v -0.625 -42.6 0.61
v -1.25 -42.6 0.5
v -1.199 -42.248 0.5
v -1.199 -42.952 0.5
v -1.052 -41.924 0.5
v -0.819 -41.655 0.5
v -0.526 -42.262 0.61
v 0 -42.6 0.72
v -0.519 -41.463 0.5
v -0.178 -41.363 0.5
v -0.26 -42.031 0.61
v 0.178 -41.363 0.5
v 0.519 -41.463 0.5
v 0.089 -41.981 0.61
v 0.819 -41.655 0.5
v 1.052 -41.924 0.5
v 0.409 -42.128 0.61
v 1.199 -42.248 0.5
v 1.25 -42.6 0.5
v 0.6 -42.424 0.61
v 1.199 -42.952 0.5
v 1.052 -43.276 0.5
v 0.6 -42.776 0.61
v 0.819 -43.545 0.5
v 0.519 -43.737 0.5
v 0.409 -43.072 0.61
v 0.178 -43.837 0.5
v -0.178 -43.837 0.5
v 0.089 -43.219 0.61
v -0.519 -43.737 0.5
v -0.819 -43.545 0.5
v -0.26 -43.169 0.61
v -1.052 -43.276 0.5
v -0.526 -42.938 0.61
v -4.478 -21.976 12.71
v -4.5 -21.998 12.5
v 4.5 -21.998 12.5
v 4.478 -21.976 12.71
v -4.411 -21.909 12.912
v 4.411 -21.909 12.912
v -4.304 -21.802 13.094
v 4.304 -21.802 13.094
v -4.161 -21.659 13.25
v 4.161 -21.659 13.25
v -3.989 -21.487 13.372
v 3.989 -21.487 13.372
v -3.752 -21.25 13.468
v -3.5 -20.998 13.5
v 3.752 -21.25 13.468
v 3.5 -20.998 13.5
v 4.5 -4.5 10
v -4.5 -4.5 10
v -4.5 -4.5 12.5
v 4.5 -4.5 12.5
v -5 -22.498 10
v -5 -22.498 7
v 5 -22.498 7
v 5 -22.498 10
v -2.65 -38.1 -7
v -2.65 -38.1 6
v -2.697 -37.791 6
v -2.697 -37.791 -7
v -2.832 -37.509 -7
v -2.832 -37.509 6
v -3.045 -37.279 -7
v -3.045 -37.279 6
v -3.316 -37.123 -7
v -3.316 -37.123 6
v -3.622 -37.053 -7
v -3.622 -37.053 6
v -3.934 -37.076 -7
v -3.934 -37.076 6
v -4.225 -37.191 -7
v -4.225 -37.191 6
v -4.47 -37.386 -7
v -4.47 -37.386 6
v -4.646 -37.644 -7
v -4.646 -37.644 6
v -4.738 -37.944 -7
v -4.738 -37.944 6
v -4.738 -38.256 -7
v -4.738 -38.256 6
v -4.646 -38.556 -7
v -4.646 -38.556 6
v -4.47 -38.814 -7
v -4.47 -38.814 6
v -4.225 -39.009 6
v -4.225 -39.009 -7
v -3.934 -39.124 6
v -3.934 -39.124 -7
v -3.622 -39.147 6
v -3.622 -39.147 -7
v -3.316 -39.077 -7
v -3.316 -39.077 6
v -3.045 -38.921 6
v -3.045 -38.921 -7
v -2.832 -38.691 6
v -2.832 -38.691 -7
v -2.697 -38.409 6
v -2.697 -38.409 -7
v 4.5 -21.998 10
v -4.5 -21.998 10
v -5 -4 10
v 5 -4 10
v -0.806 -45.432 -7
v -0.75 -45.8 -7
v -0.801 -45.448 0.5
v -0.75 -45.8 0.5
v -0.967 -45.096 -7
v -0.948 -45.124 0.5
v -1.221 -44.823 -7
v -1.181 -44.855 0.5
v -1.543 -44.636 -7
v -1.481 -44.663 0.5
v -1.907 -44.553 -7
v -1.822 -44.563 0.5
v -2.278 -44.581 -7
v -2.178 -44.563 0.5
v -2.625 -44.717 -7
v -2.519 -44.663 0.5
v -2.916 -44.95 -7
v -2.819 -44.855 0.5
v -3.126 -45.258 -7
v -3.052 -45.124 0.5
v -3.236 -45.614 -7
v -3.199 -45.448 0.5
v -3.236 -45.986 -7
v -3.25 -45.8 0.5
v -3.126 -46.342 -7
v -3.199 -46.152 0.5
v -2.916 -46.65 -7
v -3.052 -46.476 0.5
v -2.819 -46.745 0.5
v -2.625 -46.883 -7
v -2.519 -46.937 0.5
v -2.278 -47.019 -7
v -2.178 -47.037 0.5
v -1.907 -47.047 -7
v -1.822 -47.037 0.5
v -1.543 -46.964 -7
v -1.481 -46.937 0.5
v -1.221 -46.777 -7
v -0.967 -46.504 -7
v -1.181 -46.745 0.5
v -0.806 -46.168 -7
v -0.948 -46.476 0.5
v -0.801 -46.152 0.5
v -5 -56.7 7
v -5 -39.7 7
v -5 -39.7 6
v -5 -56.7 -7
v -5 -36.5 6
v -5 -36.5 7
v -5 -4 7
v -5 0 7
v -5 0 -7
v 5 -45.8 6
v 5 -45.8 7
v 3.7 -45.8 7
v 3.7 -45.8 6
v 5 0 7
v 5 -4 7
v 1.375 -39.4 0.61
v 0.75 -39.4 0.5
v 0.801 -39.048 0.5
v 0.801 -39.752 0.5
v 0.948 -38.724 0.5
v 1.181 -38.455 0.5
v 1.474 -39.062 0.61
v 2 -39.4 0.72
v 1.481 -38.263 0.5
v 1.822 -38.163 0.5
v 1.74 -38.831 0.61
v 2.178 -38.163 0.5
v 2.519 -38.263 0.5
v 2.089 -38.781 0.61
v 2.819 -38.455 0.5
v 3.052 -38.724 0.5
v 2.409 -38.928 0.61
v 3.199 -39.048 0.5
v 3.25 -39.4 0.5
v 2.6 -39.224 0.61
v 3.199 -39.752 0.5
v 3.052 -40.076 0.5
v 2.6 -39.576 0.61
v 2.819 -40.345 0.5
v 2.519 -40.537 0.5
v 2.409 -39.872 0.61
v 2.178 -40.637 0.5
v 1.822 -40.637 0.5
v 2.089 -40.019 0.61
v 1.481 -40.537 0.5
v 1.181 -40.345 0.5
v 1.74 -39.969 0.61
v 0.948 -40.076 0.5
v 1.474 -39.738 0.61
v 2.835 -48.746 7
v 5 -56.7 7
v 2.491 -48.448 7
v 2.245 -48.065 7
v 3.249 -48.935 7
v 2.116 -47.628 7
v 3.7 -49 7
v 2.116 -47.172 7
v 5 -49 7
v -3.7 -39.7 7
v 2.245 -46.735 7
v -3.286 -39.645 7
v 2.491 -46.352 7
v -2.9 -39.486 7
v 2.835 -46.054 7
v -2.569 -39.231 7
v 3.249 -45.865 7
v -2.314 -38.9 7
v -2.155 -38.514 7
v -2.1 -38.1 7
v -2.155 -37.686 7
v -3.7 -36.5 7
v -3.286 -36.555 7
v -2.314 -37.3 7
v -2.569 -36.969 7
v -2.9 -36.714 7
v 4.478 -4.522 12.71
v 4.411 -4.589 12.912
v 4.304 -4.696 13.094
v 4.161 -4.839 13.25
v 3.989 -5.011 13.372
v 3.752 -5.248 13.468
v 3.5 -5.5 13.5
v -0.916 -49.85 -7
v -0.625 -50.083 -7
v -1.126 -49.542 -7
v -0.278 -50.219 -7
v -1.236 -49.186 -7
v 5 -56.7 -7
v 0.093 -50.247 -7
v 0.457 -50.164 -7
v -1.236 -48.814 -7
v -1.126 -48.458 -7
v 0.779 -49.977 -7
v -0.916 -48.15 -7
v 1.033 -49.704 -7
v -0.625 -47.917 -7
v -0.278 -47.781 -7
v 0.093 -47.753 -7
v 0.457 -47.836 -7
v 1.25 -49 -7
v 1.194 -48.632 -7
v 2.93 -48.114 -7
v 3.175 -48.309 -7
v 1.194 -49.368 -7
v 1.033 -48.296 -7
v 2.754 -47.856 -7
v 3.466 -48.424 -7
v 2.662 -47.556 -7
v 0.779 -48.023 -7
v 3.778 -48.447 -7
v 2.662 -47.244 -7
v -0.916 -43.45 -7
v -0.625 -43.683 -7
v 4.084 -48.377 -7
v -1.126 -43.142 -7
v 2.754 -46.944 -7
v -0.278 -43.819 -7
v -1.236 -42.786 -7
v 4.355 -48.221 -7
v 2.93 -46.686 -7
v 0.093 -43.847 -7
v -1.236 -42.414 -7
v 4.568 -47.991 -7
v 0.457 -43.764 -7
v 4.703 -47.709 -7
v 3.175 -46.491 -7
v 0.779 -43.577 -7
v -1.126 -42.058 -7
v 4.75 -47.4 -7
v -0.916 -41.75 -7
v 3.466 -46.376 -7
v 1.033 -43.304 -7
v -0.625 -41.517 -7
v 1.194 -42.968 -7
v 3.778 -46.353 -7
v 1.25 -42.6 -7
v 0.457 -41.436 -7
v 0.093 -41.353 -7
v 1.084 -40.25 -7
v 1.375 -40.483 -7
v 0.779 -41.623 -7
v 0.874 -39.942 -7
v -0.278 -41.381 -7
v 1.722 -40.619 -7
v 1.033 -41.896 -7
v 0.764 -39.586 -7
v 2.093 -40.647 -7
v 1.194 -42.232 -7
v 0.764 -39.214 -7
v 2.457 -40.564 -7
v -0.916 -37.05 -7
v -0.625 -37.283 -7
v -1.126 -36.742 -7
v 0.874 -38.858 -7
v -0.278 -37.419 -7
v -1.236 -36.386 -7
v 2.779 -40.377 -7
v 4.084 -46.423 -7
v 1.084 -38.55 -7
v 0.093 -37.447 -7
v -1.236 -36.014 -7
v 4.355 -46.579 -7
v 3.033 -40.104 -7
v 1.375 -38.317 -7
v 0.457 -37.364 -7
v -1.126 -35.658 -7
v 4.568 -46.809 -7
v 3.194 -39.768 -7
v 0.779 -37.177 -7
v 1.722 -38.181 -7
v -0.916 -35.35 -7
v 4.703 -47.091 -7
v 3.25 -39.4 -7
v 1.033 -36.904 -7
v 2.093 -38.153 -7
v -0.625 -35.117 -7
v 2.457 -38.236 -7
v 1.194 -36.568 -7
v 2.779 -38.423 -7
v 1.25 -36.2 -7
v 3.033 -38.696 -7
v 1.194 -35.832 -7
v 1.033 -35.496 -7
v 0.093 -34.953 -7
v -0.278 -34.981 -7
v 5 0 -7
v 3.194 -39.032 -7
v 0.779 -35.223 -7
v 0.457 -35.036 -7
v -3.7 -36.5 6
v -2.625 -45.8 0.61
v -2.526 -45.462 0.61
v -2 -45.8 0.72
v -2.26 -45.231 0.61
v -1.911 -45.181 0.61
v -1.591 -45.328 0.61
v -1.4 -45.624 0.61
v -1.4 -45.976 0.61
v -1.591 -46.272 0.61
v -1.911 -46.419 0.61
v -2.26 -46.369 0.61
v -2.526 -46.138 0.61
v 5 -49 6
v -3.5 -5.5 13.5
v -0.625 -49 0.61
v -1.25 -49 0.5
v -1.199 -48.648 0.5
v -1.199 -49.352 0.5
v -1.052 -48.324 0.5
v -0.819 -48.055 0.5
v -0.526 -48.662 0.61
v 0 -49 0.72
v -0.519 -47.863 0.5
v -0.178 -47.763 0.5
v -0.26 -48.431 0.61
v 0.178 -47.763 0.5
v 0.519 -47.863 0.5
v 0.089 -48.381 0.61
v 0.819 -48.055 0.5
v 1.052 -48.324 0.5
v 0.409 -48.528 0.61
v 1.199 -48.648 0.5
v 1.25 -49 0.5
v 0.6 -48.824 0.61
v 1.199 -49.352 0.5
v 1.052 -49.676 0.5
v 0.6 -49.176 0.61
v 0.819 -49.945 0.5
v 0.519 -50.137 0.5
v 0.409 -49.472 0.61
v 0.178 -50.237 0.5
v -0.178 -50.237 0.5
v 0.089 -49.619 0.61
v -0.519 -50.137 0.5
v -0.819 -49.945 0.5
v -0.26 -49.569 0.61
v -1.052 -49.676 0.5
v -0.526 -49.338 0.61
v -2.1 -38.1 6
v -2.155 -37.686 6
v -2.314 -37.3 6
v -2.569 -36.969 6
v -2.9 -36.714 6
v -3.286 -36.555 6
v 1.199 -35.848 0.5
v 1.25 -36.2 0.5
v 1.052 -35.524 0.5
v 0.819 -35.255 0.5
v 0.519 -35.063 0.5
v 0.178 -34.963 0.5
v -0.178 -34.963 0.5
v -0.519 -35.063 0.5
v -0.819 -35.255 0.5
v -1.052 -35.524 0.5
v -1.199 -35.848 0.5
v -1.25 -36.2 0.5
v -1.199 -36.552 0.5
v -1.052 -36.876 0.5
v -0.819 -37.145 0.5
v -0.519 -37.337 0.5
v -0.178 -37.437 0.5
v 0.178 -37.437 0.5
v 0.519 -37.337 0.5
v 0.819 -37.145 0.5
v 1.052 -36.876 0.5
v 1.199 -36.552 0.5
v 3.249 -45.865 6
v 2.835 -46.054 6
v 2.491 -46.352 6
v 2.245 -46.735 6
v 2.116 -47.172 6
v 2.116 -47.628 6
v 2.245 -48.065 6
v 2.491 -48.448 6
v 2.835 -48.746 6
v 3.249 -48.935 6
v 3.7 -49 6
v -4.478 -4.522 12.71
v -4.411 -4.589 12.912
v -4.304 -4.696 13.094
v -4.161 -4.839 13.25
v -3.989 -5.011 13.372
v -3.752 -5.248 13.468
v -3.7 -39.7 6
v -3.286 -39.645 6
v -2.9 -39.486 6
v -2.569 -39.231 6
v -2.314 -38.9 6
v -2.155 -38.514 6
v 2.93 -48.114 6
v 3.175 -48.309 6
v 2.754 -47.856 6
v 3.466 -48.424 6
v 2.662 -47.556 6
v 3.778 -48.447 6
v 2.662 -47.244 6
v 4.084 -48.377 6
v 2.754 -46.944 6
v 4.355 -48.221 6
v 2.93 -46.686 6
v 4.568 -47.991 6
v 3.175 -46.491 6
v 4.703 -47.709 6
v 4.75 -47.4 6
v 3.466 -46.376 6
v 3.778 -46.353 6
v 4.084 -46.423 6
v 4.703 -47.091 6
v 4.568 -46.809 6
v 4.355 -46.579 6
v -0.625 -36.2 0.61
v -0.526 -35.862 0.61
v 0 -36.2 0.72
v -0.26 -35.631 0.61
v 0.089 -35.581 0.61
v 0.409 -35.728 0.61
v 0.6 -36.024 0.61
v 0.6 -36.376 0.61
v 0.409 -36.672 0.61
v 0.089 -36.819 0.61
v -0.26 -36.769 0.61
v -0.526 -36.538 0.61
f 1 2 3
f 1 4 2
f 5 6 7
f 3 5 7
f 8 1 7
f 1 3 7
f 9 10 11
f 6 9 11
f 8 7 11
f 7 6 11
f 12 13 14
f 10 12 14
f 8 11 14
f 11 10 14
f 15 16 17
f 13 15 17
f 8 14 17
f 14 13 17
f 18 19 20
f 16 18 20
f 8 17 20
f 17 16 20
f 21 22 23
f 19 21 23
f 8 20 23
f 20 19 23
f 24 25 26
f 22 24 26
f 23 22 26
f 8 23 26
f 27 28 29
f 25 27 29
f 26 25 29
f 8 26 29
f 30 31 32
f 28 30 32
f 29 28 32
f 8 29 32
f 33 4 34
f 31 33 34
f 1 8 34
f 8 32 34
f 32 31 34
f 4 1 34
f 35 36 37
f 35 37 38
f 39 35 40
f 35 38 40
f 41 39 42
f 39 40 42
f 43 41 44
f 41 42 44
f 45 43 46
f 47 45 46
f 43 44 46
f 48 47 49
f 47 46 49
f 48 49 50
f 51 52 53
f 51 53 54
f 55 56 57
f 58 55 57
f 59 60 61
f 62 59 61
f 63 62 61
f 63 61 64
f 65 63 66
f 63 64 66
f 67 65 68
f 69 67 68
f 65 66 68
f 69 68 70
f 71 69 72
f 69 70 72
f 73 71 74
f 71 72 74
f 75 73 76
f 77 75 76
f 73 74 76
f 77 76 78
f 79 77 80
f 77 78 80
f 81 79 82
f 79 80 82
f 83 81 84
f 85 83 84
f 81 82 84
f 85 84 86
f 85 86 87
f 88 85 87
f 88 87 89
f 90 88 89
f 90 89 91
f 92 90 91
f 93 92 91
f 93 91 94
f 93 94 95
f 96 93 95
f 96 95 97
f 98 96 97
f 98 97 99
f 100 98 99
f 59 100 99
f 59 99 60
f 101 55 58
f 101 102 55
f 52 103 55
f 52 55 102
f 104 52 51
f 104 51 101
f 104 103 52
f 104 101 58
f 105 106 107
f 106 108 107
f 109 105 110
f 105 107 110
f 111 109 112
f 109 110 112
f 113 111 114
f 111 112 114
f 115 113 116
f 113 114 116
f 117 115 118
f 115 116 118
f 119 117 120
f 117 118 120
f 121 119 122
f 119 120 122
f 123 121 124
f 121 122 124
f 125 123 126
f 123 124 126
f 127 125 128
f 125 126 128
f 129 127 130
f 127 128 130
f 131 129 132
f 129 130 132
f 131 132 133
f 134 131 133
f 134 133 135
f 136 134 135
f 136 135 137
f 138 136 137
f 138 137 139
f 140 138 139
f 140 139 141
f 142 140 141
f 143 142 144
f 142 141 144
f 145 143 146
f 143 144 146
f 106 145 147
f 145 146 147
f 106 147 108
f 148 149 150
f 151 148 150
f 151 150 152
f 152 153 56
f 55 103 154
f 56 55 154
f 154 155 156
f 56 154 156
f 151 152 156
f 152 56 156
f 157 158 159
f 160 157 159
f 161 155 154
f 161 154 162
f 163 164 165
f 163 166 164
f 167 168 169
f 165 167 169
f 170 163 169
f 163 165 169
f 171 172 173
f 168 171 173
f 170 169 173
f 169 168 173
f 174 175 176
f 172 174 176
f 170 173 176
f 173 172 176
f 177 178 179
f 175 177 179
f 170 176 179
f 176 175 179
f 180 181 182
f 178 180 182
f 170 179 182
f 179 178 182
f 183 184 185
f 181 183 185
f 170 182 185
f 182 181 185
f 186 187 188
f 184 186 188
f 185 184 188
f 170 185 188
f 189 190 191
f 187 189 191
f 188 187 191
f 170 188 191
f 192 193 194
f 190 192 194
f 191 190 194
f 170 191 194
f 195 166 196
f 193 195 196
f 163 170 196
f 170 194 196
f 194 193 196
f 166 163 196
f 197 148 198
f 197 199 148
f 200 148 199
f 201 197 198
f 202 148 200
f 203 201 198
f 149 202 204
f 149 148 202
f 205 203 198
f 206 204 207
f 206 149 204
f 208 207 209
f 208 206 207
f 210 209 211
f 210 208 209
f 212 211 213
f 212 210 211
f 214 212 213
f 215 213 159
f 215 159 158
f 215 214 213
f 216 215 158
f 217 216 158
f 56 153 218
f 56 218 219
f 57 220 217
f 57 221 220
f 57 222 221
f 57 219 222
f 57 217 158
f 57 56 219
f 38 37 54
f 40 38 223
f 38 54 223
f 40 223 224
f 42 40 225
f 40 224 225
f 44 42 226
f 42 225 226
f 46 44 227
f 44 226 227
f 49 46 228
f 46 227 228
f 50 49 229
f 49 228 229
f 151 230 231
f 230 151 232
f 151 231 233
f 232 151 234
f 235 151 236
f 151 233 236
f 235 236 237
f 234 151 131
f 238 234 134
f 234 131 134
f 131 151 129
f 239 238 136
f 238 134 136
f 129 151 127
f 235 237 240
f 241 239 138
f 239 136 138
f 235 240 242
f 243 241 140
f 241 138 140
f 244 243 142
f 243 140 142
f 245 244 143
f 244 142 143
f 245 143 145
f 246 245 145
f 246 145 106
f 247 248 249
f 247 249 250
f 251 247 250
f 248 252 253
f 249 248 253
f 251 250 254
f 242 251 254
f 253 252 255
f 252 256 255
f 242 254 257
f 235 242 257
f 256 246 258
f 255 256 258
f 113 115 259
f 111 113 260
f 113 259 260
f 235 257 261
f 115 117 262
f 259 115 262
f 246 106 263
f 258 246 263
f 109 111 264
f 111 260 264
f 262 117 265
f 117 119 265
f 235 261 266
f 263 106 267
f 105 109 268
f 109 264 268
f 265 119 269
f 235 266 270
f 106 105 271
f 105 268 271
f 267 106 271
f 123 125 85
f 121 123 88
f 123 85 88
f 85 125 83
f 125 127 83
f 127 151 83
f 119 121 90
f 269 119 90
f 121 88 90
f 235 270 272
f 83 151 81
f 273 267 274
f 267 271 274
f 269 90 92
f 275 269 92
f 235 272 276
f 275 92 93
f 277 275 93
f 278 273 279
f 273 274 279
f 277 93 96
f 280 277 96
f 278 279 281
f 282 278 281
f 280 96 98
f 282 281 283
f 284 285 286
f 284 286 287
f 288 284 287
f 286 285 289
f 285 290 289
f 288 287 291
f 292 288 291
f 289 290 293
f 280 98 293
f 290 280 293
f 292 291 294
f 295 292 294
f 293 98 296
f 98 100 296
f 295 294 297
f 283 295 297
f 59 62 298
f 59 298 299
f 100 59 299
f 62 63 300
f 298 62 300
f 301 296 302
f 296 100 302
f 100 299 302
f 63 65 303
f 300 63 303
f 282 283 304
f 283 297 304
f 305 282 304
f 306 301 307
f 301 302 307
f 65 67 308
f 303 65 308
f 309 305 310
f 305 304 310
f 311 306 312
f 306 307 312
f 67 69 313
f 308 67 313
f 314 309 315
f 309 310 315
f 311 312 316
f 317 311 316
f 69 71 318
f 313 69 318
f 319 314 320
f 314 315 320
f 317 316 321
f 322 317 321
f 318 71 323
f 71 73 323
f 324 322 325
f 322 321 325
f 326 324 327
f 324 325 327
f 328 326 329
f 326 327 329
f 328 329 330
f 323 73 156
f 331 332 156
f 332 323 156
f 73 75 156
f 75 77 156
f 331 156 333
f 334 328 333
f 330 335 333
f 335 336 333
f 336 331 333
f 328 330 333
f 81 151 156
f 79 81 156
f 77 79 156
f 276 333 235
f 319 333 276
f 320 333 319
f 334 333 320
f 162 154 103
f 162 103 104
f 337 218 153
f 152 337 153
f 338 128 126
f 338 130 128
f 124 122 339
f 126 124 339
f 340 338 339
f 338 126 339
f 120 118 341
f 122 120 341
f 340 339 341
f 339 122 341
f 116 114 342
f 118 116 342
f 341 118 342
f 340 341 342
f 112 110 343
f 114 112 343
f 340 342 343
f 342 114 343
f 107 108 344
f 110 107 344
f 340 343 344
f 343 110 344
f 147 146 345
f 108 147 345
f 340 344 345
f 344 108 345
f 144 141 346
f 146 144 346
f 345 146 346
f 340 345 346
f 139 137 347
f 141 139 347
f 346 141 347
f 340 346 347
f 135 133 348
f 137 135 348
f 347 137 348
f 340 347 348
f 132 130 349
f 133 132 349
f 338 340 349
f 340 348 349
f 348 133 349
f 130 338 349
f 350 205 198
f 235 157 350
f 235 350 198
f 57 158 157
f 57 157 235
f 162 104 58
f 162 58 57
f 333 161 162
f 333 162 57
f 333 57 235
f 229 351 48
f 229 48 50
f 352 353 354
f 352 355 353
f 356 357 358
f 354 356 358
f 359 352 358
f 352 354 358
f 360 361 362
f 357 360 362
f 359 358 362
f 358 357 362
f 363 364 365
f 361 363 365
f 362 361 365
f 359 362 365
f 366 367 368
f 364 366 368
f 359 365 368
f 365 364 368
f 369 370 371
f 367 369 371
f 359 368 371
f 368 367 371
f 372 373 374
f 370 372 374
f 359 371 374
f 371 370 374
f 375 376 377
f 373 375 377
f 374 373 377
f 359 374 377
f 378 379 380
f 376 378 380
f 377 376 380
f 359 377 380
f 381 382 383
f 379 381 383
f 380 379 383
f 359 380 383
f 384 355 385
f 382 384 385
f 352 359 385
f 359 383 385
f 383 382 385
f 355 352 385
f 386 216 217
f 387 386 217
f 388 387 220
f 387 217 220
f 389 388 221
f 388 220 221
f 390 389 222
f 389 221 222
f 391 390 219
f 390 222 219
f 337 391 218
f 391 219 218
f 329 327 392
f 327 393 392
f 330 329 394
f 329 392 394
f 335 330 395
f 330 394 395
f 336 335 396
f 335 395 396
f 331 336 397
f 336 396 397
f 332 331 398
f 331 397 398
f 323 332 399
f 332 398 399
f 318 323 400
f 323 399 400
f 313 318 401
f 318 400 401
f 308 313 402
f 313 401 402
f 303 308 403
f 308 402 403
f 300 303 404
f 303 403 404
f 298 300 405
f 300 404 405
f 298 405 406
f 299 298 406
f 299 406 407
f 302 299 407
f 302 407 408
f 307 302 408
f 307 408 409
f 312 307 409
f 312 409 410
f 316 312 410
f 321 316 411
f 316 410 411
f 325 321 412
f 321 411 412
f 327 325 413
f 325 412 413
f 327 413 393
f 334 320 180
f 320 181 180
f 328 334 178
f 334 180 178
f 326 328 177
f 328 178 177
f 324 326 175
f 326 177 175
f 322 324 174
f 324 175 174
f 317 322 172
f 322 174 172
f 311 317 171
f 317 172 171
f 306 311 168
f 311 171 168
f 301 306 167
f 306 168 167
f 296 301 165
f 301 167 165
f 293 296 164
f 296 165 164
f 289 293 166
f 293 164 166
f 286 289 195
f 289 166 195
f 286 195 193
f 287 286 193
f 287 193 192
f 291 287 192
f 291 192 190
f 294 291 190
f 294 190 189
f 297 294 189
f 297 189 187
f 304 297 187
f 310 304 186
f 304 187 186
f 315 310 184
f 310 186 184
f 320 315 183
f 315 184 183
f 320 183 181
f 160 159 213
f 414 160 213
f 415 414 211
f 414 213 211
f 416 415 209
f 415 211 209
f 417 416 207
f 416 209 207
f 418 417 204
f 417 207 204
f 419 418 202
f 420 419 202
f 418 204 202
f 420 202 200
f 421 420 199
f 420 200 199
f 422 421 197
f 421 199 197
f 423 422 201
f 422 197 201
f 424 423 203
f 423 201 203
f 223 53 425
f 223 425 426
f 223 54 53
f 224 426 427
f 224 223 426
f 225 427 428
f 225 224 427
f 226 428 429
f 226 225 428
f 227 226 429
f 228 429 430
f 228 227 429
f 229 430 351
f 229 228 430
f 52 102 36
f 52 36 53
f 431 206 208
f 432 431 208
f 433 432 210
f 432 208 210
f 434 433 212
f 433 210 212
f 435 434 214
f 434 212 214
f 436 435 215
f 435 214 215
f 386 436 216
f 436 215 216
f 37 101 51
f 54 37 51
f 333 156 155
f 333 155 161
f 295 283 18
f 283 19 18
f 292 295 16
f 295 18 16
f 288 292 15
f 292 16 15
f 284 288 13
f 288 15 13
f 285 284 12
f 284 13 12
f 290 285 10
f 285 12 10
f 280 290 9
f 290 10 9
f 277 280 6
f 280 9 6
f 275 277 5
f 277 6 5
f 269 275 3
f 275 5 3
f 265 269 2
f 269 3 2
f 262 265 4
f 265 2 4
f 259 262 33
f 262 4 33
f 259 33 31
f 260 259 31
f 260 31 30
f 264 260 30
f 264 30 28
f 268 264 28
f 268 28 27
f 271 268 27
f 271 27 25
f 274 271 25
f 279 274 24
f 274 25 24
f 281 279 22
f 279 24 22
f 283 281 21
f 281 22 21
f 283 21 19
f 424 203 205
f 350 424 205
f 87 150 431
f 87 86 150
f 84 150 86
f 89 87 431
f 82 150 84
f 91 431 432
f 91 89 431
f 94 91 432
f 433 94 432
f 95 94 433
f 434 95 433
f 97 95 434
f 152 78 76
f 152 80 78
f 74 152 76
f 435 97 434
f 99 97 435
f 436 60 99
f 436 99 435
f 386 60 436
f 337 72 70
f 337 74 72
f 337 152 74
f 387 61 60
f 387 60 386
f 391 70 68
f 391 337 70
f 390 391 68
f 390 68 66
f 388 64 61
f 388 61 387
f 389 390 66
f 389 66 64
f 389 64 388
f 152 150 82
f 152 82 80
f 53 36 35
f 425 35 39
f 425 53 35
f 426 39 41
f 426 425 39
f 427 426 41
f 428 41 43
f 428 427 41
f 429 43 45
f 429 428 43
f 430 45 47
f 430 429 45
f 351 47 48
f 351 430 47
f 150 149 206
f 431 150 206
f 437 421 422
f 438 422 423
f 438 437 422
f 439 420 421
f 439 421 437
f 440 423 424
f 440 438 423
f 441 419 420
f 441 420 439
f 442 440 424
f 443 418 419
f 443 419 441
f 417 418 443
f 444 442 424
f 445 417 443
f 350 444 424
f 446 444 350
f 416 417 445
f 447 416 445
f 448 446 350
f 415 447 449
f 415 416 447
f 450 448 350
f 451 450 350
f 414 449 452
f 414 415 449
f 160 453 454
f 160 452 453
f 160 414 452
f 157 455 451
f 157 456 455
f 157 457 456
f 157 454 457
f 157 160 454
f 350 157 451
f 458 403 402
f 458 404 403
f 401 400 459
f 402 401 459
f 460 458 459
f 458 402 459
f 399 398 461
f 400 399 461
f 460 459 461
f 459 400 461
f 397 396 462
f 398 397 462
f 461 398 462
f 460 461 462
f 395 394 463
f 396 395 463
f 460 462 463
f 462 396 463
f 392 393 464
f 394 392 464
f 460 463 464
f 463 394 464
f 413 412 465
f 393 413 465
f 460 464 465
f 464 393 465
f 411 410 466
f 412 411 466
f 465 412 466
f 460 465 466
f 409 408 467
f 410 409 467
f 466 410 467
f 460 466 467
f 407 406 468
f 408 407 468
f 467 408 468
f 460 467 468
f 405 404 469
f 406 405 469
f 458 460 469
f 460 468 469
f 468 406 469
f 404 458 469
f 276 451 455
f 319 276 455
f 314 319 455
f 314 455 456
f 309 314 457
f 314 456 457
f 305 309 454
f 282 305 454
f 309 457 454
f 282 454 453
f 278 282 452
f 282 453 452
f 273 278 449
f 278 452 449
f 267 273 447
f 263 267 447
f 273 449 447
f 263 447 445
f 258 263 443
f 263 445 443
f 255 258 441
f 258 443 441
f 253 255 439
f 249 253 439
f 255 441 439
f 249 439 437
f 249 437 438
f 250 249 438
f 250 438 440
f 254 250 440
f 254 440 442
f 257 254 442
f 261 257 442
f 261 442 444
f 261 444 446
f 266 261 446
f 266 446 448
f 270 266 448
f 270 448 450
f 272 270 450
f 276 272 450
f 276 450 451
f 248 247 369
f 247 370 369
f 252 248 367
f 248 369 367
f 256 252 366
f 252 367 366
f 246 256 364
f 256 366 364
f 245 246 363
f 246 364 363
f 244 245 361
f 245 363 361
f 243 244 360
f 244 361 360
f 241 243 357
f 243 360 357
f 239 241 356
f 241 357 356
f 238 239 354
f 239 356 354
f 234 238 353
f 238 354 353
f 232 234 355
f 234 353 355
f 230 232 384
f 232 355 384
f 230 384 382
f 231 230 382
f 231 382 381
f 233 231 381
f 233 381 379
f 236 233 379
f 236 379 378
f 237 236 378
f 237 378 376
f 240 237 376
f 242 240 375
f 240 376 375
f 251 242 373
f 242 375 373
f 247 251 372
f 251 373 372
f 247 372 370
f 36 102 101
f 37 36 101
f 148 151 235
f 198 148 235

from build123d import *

# Parameters (mm, degrees)
SKETCH1_W                         = 10
SKETCH1_H                         = 14
EXTRUDE1_DEPTH                    = 56.7
SKETCH2_W                         = 10
SKETCH2_H                         = 18.498
EXTRUDE2_DEPTH                    = 3
M3X0_5_TAPPED_HOLE1_D             = 2.5
M3X0_5_TAPPED_HOLE1_DEPTH         = 7.5
M3X0_5_TAPPED_HOLE1_TIP           = 0.220408726
SKETCH5_R                         = 1.05
MANIFOLD_SCREWS_COUNTERBORE_DEPTH = 15
SKETCH6_R                         = 1.05
MOUNTING_HOLE_DEPTH               = 1
SKETCH7_W                         = 9
SKETCH7_H                         = 17.498
EXTRUDE3_DEPTH                    = 3.5
FILLET1_R                         = 1


with BuildPart() as part:
    # Sketch1 → Extrude1 (new body)
    with BuildSketch(Plane(origin=(0, 0, 0), x_dir=(1, 0, 0), z_dir=(0, 1, 0))):
        Rectangle(SKETCH1_W, SKETCH1_H)
    extrude(amount=-EXTRUDE1_DEPTH)

    # Sketch2 → Extrude2 (add)
    with BuildSketch(Plane.XY.offset(7)):
        with Locations((0, -13.249)):
            Rectangle(SKETCH2_W, SKETCH2_H)
    extrude(amount=EXTRUDE2_DEPTH)

    # M3x0.5 Tapped Hole1
    with Locations(Plane(origin=(0, -36.2, -7), x_dir=(-1, 0, 0), z_dir=(0, 0, -1))):
        with Locations((0, 0), (0, -6.4), (0, -12.8), (2, -9.6), (-2, -3.2)):
            Hole(M3X0_5_TAPPED_HOLE1_D / 2, depth=M3X0_5_TAPPED_HOLE1_DEPTH)
            with Locations((0, 0, -(M3X0_5_TAPPED_HOLE1_DEPTH + M3X0_5_TAPPED_HOLE1_TIP / 2))):  # 160° drill point
                Cone(0, M3X0_5_TAPPED_HOLE1_D / 2, M3X0_5_TAPPED_HOLE1_TIP, mode=Mode.SUBTRACT)

    # Sketch5 → Manifold Screws Counterbore (cut, through all)
    with BuildSketch(Plane.XY.offset(7)):
        with Locations((-3.7, -38.1)):
            Circle(SKETCH5_R)
        with Locations((3.7, -47.4)):
            Circle(SKETCH5_R)
    extrude(amount=-MANIFOLD_SCREWS_COUNTERBORE_DEPTH, mode=Mode.SUBTRACT)

    # Sketch6 → Mounting Hole (cut)
    with BuildSketch(Plane.XY.offset(7)):
        with BuildLine():
            ThreePointArc((-2.1, -38.1), (-2.56862915, -36.96862915), (-3.7, -36.5))
            ThreePointArc((-3.7, -36.5), (-4.4306228, -36.676556877), (-5, -37.167262095))
            Line((-5, -37.167262095), (-5, -39.032737905))
            ThreePointArc((-5, -39.032737905), (-4.4306228, -39.523443123), (-3.7, -39.7))
            ThreePointArc((-3.7, -39.7), (-2.56862915, -39.23137085), (-2.1, -38.1))
        make_face()
        with Locations((-3.7, -38.1)):
            Circle(SKETCH6_R, mode=Mode.SUBTRACT)
        with BuildLine():
            Line((5, -48.332737905), (5, -46.467262095))
            ThreePointArc((5, -46.467262095), (4.4306228, -45.976556877), (3.7, -45.8))
            ThreePointArc((3.7, -45.8), (2.1, -47.4), (3.7, -49))
            ThreePointArc((3.7, -49), (4.4306228, -48.823443123), (5, -48.332737905))
        make_face()
        with Locations((3.7, -47.4)):
            Circle(SKETCH6_R, mode=Mode.SUBTRACT)
        with BuildLine():
            Line((5, -46.467262095), (5, -45.8))
            Line((5, -45.8), (3.7, -45.8))
            ThreePointArc((3.7, -45.8), (4.4306228, -45.976556877), (5, -46.467262095))
        make_face()
        with BuildLine():
            Line((5, -49), (5, -48.332737905))
            ThreePointArc((5, -48.332737905), (4.4306228, -48.823443123), (3.7, -49))
            Line((3.7, -49), (5, -49))
        make_face()
        with BuildLine():
            ThreePointArc((-5, -37.167262095), (-4.4306228, -36.676556877), (-3.7, -36.5))
            Line((-3.7, -36.5), (-5, -36.5))
            Line((-5, -36.5), (-5, -37.167262095))
        make_face()
        with BuildLine():
            Line((-5, -39.7), (-3.7, -39.7))
            ThreePointArc((-3.7, -39.7), (-4.4306228, -39.523443123), (-5, -39.032737905))
            Line((-5, -39.032737905), (-5, -39.7))
        make_face()
    extrude(amount=-MOUNTING_HOLE_DEPTH, mode=Mode.SUBTRACT)

    # Sketch7 → Extrude3 (add)
    with BuildSketch(Plane.XY.offset(10)):
        with Locations((0, -13.249)):
            Rectangle(SKETCH7_W, SKETCH7_H)
    extrude(amount=EXTRUDE3_DEPTH)

    # Fillet1
    fillet1_edges = [part.edges().sort_by_distance(p)[0] for p in [
        (0, -4.5, 13.5),
        (-4.5, -13.249, 13.5),
        (0, -21.998, 13.5),
        (4.5, -13.249, 13.5),
    ]]
    fillet(fillet1_edges, radius=FILLET1_R)


solid = part.part
